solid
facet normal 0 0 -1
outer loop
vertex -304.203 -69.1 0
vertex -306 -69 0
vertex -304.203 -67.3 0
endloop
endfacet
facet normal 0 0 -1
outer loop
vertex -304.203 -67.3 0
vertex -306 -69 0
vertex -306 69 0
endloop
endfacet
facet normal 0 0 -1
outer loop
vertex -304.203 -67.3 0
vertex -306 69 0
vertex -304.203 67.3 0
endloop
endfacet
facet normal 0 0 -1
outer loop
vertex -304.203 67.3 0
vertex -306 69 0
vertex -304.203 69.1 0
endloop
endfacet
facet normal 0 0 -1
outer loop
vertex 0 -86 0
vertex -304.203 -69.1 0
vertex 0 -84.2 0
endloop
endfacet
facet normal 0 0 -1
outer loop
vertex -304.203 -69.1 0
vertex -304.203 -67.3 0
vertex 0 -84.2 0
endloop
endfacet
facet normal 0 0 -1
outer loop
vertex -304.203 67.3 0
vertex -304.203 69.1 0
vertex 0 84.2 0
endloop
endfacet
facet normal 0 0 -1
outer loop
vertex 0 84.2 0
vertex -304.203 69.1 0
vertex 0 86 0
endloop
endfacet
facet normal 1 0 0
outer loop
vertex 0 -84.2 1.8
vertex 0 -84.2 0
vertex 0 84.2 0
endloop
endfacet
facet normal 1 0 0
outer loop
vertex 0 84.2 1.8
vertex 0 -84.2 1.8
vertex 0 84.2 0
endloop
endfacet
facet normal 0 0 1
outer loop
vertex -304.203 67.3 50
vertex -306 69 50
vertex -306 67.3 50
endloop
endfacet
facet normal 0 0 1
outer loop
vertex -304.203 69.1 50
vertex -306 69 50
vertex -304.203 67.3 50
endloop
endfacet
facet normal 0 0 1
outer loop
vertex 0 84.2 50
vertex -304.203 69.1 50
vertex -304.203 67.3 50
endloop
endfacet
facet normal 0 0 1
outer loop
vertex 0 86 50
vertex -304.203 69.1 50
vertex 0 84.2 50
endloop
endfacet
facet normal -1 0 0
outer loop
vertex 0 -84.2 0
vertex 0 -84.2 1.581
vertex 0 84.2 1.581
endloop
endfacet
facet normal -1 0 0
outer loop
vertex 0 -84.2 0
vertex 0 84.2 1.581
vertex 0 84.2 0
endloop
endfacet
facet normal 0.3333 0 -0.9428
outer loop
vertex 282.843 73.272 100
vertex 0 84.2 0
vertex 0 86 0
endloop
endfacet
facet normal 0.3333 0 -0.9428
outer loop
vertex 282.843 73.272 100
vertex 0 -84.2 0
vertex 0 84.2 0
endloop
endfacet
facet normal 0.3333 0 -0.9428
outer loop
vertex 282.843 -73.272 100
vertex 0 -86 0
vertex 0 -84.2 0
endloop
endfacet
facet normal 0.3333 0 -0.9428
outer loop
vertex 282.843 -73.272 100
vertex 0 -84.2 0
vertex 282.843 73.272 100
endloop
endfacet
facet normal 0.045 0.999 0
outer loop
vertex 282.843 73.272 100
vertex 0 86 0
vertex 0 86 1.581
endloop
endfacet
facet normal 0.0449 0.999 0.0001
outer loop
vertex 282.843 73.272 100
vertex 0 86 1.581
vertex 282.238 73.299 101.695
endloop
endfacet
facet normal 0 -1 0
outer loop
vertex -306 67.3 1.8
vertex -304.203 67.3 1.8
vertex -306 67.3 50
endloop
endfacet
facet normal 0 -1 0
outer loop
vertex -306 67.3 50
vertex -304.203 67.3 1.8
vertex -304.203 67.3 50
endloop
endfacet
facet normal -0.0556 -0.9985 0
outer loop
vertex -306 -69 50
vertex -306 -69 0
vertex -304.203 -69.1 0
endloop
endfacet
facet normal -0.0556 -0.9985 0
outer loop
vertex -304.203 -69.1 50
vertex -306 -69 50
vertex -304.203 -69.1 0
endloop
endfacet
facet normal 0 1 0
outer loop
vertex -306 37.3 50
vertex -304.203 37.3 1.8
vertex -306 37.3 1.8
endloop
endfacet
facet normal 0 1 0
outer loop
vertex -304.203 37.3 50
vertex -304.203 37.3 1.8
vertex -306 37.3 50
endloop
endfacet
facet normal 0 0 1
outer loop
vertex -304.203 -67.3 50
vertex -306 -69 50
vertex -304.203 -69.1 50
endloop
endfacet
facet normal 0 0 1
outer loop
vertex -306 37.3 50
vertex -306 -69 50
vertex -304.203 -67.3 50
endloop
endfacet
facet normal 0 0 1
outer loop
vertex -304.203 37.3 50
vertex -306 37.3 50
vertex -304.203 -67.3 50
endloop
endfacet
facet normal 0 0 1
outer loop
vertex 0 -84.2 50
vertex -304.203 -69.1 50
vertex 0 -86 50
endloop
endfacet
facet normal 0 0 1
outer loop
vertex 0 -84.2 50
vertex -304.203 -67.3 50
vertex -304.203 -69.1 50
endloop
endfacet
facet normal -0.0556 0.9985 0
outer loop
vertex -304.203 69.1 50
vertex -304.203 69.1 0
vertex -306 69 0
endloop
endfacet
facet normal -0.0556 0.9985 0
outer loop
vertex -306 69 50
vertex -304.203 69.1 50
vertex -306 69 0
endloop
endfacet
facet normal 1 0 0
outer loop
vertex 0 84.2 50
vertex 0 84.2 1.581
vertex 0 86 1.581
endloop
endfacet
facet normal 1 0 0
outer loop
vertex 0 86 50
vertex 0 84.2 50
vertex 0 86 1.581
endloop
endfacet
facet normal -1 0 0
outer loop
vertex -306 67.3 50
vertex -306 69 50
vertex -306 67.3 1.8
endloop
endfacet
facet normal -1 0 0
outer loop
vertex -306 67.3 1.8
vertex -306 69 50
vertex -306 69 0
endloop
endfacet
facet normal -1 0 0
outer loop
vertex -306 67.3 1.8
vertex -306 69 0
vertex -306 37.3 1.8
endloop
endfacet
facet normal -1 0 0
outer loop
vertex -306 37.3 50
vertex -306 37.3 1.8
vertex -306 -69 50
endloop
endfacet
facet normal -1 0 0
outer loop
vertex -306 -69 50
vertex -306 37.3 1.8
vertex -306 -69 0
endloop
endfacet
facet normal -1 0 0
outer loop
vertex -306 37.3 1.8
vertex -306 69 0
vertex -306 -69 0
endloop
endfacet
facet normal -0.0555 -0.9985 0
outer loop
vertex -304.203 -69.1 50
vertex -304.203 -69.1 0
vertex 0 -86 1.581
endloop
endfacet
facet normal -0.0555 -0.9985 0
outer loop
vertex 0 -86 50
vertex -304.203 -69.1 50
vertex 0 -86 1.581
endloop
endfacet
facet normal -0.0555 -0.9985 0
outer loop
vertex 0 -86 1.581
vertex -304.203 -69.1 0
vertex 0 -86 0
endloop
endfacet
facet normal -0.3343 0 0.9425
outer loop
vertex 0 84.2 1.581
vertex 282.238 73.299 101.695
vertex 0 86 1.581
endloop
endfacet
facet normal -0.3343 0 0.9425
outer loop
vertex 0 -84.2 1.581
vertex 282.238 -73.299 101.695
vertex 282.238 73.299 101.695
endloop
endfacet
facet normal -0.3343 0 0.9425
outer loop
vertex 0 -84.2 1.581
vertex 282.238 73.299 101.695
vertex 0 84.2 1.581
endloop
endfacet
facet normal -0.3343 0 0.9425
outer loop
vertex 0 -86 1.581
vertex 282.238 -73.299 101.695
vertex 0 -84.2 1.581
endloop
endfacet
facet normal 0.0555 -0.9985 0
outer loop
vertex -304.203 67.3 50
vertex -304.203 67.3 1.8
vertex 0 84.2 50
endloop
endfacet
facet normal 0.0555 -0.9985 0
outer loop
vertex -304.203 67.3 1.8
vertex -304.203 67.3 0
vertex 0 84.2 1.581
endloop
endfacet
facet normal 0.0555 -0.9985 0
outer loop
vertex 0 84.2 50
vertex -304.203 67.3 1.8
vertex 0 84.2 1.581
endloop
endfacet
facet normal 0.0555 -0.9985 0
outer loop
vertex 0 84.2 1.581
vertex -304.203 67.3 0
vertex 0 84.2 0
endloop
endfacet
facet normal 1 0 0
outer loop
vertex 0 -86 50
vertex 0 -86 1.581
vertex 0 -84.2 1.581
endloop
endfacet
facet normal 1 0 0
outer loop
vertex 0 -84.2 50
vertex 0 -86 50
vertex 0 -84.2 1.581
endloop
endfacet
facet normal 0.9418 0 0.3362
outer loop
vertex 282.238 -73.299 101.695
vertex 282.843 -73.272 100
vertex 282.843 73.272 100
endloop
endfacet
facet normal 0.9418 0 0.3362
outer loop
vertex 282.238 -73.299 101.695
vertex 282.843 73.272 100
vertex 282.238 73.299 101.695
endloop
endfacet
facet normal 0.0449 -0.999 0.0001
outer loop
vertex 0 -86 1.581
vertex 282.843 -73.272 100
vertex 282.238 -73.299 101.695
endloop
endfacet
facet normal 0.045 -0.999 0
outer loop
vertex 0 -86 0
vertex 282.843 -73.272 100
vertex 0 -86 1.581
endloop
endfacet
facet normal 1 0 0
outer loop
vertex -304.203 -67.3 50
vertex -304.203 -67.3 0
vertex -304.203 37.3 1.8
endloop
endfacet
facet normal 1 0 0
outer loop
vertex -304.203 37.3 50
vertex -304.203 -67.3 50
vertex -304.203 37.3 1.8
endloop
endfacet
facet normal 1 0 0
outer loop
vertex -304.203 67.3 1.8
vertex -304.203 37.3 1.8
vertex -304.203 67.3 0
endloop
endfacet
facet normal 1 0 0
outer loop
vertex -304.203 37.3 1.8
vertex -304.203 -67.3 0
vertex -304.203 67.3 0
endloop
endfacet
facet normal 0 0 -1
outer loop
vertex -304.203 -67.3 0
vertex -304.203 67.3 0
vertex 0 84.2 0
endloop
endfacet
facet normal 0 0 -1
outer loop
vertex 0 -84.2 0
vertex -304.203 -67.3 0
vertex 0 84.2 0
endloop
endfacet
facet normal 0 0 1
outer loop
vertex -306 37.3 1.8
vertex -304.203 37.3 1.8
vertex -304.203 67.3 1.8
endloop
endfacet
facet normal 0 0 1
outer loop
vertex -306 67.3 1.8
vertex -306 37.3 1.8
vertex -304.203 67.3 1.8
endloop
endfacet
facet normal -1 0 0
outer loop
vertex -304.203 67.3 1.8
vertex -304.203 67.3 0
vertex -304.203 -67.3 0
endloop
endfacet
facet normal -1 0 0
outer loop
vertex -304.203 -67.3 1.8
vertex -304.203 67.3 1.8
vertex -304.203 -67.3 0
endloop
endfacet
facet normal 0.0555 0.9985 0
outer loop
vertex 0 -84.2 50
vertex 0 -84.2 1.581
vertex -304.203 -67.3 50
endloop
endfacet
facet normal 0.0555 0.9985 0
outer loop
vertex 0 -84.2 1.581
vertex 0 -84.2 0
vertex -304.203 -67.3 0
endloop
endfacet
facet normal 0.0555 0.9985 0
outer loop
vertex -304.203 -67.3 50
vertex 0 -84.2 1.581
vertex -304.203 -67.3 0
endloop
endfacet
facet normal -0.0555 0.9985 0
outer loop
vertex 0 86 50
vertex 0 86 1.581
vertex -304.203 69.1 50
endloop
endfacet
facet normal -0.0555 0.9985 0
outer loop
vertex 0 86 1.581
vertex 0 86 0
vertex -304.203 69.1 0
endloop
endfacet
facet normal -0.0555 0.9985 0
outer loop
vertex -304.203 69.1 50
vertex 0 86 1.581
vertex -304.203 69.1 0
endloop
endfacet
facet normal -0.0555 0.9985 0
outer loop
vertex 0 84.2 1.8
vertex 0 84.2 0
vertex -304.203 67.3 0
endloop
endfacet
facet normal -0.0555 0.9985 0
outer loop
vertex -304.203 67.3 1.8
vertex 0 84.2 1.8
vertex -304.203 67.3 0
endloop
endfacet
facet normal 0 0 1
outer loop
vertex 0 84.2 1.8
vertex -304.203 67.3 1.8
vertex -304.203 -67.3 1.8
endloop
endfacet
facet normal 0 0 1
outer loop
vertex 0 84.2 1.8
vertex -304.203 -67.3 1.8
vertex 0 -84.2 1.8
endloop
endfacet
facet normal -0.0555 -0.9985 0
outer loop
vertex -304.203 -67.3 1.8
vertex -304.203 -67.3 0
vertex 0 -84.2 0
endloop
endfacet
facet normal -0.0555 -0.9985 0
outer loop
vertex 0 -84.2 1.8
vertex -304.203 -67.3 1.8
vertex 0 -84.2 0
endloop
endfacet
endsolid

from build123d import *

# Parameters (mm, degrees)
F2_DEPTH = 86
F3_DEPTH = 121
F4_DEPTH = 50
F5_DEPTH = 1.8
F6_W     = 30
F6_H     = 48.2
F7_DEPTH = 25


with BuildPart() as f2:
    # F1 (on Front) → F2 (new body, symmetric)
    with BuildSketch(Plane.XZ):
        Polygon((0, 1.58114), (0, 0), (282.84278, 99.99981), (282.237692, 101.695059), align=None)
    extrude(amount=F2_DEPTH, both=True)

    # F0 (on Top) → F3 (cut)
    with BuildSketch(Plane.XY):
        Polygon((300, -72.5), (0, -86), (300, -86), align=None)
        Polygon((300, 86), (0, 86), (300, 72.5), align=None)
    extrude(amount=F3_DEPTH, mode=Mode.SUBTRACT)

    # F0 (on Top) → F4 (join)
    with BuildSketch(Plane.XY):
        Polygon((-306, 67.2), (-306, 0), (-306, -67.2), (-304.202771, -67.299846), (-304.202771, 67.299846), align=None)
        Polygon((0, -84.2), (-304.202771, -67.299846), (-304.202771, -69.099846), (0, -86), align=None)
        Polygon((-304.202771, 69.099846), (-304.202771, 67.299846), (0, 84.2), (0, 86), align=None)
        Polygon((-304.202771, -67.299846), (-306, -67.2), (-306, -69), (-304.202771, -69.099846), align=None)
        Polygon((-306, 69), (-306, 67.2), (-304.202771, 67.299846), (-304.202771, 69.099846), align=None)
    extrude(amount=F4_DEPTH)

    # F6 (on face) → F7 (cut)
    with BuildSketch(Plane.YZ.offset(-304.202771)):
        with Locations((52.299846, 25.9)):
            Rectangle(F6_W, F6_H)
    extrude(amount=-F7_DEPTH, mode=Mode.SUBTRACT)


with BuildPart() as f5:
    # F0 (on Top) → F5 (new body)
    with BuildSketch(Plane.XY):
        Polygon((-304.202771, 67.299846), (-304.202771, -67.299846), (0, -84.2), (0, 84.2), align=None)
    extrude(amount=F5_DEPTH)


solid = Compound([f2.part, f5.part])
